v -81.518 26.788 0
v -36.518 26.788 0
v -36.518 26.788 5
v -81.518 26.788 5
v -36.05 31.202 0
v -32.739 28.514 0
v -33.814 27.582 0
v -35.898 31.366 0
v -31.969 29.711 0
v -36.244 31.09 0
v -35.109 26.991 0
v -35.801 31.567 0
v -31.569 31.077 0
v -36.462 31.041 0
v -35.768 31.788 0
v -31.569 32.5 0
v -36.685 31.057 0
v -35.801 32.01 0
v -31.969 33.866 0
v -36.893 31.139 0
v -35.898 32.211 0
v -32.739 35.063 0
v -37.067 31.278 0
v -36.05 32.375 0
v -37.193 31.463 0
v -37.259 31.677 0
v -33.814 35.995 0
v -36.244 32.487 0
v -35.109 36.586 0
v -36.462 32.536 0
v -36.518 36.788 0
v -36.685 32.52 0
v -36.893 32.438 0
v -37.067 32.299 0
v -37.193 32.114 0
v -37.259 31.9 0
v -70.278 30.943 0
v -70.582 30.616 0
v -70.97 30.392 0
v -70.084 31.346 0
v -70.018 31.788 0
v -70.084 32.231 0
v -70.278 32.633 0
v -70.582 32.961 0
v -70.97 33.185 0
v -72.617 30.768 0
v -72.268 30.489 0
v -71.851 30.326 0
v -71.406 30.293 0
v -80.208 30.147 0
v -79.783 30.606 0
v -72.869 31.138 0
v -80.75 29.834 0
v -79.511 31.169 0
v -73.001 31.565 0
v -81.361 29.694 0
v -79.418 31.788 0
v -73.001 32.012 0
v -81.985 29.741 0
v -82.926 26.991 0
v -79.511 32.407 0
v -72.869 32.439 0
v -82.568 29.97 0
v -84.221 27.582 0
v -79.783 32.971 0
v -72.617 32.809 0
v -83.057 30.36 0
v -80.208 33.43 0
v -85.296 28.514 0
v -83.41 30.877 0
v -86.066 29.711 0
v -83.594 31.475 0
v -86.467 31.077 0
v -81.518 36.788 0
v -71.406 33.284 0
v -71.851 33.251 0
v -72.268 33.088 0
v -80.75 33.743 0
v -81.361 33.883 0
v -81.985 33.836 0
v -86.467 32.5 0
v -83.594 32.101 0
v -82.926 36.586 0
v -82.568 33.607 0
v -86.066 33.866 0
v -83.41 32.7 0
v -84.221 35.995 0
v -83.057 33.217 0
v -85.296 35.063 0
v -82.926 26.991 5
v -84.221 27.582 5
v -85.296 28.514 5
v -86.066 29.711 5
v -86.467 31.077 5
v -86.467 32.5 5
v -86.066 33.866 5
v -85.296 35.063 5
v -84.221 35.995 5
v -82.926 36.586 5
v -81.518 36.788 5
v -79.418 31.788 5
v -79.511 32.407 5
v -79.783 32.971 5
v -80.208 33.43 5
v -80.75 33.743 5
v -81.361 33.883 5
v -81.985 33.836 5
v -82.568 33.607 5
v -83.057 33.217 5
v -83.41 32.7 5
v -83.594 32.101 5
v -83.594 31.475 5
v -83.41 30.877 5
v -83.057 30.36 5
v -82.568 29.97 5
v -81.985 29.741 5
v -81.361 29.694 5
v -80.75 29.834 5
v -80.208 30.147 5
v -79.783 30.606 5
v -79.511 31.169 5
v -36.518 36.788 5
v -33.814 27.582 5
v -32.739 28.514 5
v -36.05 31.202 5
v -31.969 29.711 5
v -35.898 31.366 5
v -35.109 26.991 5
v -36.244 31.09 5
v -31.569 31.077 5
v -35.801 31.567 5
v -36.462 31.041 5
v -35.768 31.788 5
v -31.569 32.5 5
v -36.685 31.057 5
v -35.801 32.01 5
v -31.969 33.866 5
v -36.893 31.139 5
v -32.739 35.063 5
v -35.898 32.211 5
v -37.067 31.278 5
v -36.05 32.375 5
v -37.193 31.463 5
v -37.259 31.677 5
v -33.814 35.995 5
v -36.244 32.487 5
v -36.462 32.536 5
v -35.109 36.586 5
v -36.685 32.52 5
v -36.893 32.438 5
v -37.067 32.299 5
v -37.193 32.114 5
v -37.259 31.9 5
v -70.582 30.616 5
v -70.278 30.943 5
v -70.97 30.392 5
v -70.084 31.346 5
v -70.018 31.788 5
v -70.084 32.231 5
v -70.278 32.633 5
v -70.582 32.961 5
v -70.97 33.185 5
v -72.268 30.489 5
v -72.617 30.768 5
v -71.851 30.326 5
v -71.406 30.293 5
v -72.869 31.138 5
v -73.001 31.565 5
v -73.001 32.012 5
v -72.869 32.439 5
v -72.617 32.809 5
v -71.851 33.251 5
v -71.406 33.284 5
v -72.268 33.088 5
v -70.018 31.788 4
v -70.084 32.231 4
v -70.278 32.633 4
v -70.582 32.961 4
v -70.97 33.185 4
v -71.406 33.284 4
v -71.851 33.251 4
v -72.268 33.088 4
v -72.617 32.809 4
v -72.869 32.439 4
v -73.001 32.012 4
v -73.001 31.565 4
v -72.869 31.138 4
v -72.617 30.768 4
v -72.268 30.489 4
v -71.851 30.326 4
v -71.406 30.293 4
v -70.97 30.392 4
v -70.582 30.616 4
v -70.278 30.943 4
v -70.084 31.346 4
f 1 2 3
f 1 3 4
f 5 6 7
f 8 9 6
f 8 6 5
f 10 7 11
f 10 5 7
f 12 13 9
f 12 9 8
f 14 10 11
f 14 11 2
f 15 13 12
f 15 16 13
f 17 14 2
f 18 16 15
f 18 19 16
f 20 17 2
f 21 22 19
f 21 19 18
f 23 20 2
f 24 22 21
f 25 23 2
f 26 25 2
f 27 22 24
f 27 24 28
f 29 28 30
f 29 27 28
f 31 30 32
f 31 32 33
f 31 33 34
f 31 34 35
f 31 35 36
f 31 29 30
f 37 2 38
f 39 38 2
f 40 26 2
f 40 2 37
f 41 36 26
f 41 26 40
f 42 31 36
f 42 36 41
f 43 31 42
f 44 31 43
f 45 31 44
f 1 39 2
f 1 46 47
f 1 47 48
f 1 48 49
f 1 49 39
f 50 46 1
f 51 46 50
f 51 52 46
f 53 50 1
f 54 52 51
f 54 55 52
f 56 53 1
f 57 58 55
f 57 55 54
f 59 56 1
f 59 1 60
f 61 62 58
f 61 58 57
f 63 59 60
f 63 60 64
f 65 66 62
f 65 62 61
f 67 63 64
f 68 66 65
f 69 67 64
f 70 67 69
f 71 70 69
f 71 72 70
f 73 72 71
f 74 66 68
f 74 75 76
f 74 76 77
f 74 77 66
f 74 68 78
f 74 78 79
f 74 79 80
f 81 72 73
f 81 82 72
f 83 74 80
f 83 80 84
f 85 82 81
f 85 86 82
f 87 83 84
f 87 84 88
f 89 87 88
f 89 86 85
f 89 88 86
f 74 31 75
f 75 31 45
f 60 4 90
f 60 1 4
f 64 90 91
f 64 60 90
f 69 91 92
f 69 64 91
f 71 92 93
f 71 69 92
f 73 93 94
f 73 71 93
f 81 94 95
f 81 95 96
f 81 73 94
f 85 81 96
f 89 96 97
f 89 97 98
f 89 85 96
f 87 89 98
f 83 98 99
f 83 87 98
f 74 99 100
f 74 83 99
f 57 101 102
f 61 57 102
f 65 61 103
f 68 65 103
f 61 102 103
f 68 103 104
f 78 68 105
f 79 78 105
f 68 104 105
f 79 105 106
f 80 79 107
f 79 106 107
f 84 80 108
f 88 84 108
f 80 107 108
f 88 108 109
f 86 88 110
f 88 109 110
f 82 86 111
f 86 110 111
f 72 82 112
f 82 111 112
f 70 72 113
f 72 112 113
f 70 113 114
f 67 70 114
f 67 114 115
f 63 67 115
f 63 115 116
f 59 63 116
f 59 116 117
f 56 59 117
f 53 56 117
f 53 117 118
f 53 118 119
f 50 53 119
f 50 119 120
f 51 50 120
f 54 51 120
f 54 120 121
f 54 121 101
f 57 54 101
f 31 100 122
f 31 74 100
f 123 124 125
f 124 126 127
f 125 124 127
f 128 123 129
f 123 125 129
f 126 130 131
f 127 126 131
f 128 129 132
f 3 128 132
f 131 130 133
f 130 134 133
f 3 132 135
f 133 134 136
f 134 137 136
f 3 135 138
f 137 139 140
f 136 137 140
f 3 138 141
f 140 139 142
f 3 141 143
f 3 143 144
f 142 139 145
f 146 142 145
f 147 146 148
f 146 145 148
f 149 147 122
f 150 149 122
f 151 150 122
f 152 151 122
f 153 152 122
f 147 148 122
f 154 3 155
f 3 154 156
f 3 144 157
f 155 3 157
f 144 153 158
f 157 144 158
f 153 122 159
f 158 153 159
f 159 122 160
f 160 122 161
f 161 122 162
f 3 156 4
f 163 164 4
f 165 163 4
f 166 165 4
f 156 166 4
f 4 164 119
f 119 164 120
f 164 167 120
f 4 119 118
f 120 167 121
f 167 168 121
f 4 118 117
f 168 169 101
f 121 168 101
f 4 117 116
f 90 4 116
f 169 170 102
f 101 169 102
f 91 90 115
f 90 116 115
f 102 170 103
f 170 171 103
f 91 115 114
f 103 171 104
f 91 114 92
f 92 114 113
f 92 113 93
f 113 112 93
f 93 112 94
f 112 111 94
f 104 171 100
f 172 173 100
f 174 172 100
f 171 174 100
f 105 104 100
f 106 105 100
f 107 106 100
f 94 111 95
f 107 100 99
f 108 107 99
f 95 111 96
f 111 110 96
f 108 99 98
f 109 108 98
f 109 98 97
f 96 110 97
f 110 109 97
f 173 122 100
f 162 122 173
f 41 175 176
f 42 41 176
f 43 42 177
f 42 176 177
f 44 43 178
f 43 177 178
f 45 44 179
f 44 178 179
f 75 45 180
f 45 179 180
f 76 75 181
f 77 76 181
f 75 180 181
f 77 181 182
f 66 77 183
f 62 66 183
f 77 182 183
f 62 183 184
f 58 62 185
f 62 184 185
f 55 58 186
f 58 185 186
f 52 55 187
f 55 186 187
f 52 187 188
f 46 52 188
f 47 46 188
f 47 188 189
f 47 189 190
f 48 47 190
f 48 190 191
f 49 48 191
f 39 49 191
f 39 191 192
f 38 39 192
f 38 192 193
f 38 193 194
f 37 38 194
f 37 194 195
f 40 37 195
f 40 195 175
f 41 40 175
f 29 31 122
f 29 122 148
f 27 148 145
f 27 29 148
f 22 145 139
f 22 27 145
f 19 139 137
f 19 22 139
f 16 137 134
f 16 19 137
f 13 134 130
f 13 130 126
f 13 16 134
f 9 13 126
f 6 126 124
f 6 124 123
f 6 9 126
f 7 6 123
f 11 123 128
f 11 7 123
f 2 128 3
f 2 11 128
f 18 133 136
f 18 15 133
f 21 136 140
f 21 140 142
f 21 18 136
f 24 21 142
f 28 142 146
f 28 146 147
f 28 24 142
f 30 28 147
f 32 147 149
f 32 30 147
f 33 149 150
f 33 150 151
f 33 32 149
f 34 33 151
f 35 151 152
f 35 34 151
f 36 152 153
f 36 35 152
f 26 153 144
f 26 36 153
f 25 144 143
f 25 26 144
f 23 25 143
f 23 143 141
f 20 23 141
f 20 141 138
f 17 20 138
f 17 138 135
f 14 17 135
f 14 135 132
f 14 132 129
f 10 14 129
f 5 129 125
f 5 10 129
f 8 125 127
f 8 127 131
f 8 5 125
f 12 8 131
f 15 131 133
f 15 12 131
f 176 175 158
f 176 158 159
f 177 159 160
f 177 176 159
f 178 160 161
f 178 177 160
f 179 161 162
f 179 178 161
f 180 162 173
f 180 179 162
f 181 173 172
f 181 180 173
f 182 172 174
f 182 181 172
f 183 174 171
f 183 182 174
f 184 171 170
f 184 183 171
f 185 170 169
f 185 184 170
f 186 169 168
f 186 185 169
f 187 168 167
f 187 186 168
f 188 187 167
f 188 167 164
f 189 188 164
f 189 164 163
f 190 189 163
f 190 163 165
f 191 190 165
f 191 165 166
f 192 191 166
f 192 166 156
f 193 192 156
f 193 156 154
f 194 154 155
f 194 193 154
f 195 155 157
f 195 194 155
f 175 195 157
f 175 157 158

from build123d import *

# Parameters (mm, degrees)
SKETCH1_R           = 1.5
SKETCH1_R_2         = 0.75
BOSS_EXTRUDE1_DEPTH = 4
SKETCH2_R           = 1.25
CUT_EXTRUDE1_DEPTH  = 4
SKETCH3_R           = 1.5
CUT_EXTRUDE2_DEPTH  = 10
SKETCH4_R           = 1.5
SKETCH4_R_2         = 0.75
BOSS_EXTRUDE2_DEPTH = 1
SKETCH5_R           = 2.1
CUT_EXTRUDE3_DEPTH  = 10


with BuildPart() as part:
    # Sketch1 → Boss-Extrude1 (new body)
    with BuildSketch(Plane.XY):
        with BuildLine():
            Line((-81.517614561, 36.788472858), (-36.517614561, 36.788472858))
            ThreePointArc((-36.517614561, 36.788472858), (-31.517614561, 31.788472858), (-36.517614561, 26.788472858))
            Line((-36.517614561, 26.788472858), (-81.517614561, 26.788472858))
            ThreePointArc((-81.517614561, 26.788472858), (-86.517614561, 31.788472858), (-81.517614561, 36.788472858))
        make_face()
        with Locations((-81.517614561, 31.788472858)):
            Circle(SKETCH1_R, mode=Mode.SUBTRACT)
        with Locations((-36.517614561, 31.788472858)):
            Circle(SKETCH1_R_2, mode=Mode.SUBTRACT)
    extrude(amount=BOSS_EXTRUDE1_DEPTH)

    # Sketch2 → Cut-Extrude1 (cut)
    with BuildSketch(Plane.XY.offset(4)):
        with Locations((-71.517614561, 31.788472858)):
            Circle(SKETCH2_R)
    extrude(amount=-CUT_EXTRUDE1_DEPTH, mode=Mode.SUBTRACT)

    # Sketch3 → Cut-Extrude2 (cut)
    with BuildSketch(Plane.XY.offset(4)):
        with Locations((-71.517614561, 31.788472858)):
            Circle(SKETCH3_R)
    extrude(amount=-CUT_EXTRUDE2_DEPTH, mode=Mode.SUBTRACT)

    # Sketch4 → Boss-Extrude2 (add)
    with BuildSketch(Plane.XY.offset(4)):
        with BuildLine():
            Line((-81.517614561, 36.788472858), (-36.517614561, 36.788472858))
            ThreePointArc((-36.517614561, 36.788472858), (-31.517614561, 31.788472858), (-36.517614561, 26.788472858))
            Line((-36.517614561, 26.788472858), (-81.517614561, 26.788472858))
            ThreePointArc((-81.517614561, 26.788472858), (-86.517614561, 31.788472858), (-81.517614561, 36.788472858))
        make_face()
        with Locations((-81.517614561, 31.788472858)):
            Circle(SKETCH4_R, mode=Mode.SUBTRACT)
        with Locations((-71.517614561, 31.788472858)):
            Circle(SKETCH4_R, mode=Mode.SUBTRACT)
        with Locations((-36.517614561, 31.788472858)):
            Circle(SKETCH4_R_2, mode=Mode.SUBTRACT)
    extrude(amount=BOSS_EXTRUDE2_DEPTH)

    # Sketch5 → Cut-Extrude3 (cut)
    with BuildSketch(Plane.XY.offset(5)):
        with Locations((-81.517614561, 31.788472858)):
            Circle(SKETCH5_R)
    extrude(amount=-CUT_EXTRUDE3_DEPTH, mode=Mode.SUBTRACT)


solid = part.part
